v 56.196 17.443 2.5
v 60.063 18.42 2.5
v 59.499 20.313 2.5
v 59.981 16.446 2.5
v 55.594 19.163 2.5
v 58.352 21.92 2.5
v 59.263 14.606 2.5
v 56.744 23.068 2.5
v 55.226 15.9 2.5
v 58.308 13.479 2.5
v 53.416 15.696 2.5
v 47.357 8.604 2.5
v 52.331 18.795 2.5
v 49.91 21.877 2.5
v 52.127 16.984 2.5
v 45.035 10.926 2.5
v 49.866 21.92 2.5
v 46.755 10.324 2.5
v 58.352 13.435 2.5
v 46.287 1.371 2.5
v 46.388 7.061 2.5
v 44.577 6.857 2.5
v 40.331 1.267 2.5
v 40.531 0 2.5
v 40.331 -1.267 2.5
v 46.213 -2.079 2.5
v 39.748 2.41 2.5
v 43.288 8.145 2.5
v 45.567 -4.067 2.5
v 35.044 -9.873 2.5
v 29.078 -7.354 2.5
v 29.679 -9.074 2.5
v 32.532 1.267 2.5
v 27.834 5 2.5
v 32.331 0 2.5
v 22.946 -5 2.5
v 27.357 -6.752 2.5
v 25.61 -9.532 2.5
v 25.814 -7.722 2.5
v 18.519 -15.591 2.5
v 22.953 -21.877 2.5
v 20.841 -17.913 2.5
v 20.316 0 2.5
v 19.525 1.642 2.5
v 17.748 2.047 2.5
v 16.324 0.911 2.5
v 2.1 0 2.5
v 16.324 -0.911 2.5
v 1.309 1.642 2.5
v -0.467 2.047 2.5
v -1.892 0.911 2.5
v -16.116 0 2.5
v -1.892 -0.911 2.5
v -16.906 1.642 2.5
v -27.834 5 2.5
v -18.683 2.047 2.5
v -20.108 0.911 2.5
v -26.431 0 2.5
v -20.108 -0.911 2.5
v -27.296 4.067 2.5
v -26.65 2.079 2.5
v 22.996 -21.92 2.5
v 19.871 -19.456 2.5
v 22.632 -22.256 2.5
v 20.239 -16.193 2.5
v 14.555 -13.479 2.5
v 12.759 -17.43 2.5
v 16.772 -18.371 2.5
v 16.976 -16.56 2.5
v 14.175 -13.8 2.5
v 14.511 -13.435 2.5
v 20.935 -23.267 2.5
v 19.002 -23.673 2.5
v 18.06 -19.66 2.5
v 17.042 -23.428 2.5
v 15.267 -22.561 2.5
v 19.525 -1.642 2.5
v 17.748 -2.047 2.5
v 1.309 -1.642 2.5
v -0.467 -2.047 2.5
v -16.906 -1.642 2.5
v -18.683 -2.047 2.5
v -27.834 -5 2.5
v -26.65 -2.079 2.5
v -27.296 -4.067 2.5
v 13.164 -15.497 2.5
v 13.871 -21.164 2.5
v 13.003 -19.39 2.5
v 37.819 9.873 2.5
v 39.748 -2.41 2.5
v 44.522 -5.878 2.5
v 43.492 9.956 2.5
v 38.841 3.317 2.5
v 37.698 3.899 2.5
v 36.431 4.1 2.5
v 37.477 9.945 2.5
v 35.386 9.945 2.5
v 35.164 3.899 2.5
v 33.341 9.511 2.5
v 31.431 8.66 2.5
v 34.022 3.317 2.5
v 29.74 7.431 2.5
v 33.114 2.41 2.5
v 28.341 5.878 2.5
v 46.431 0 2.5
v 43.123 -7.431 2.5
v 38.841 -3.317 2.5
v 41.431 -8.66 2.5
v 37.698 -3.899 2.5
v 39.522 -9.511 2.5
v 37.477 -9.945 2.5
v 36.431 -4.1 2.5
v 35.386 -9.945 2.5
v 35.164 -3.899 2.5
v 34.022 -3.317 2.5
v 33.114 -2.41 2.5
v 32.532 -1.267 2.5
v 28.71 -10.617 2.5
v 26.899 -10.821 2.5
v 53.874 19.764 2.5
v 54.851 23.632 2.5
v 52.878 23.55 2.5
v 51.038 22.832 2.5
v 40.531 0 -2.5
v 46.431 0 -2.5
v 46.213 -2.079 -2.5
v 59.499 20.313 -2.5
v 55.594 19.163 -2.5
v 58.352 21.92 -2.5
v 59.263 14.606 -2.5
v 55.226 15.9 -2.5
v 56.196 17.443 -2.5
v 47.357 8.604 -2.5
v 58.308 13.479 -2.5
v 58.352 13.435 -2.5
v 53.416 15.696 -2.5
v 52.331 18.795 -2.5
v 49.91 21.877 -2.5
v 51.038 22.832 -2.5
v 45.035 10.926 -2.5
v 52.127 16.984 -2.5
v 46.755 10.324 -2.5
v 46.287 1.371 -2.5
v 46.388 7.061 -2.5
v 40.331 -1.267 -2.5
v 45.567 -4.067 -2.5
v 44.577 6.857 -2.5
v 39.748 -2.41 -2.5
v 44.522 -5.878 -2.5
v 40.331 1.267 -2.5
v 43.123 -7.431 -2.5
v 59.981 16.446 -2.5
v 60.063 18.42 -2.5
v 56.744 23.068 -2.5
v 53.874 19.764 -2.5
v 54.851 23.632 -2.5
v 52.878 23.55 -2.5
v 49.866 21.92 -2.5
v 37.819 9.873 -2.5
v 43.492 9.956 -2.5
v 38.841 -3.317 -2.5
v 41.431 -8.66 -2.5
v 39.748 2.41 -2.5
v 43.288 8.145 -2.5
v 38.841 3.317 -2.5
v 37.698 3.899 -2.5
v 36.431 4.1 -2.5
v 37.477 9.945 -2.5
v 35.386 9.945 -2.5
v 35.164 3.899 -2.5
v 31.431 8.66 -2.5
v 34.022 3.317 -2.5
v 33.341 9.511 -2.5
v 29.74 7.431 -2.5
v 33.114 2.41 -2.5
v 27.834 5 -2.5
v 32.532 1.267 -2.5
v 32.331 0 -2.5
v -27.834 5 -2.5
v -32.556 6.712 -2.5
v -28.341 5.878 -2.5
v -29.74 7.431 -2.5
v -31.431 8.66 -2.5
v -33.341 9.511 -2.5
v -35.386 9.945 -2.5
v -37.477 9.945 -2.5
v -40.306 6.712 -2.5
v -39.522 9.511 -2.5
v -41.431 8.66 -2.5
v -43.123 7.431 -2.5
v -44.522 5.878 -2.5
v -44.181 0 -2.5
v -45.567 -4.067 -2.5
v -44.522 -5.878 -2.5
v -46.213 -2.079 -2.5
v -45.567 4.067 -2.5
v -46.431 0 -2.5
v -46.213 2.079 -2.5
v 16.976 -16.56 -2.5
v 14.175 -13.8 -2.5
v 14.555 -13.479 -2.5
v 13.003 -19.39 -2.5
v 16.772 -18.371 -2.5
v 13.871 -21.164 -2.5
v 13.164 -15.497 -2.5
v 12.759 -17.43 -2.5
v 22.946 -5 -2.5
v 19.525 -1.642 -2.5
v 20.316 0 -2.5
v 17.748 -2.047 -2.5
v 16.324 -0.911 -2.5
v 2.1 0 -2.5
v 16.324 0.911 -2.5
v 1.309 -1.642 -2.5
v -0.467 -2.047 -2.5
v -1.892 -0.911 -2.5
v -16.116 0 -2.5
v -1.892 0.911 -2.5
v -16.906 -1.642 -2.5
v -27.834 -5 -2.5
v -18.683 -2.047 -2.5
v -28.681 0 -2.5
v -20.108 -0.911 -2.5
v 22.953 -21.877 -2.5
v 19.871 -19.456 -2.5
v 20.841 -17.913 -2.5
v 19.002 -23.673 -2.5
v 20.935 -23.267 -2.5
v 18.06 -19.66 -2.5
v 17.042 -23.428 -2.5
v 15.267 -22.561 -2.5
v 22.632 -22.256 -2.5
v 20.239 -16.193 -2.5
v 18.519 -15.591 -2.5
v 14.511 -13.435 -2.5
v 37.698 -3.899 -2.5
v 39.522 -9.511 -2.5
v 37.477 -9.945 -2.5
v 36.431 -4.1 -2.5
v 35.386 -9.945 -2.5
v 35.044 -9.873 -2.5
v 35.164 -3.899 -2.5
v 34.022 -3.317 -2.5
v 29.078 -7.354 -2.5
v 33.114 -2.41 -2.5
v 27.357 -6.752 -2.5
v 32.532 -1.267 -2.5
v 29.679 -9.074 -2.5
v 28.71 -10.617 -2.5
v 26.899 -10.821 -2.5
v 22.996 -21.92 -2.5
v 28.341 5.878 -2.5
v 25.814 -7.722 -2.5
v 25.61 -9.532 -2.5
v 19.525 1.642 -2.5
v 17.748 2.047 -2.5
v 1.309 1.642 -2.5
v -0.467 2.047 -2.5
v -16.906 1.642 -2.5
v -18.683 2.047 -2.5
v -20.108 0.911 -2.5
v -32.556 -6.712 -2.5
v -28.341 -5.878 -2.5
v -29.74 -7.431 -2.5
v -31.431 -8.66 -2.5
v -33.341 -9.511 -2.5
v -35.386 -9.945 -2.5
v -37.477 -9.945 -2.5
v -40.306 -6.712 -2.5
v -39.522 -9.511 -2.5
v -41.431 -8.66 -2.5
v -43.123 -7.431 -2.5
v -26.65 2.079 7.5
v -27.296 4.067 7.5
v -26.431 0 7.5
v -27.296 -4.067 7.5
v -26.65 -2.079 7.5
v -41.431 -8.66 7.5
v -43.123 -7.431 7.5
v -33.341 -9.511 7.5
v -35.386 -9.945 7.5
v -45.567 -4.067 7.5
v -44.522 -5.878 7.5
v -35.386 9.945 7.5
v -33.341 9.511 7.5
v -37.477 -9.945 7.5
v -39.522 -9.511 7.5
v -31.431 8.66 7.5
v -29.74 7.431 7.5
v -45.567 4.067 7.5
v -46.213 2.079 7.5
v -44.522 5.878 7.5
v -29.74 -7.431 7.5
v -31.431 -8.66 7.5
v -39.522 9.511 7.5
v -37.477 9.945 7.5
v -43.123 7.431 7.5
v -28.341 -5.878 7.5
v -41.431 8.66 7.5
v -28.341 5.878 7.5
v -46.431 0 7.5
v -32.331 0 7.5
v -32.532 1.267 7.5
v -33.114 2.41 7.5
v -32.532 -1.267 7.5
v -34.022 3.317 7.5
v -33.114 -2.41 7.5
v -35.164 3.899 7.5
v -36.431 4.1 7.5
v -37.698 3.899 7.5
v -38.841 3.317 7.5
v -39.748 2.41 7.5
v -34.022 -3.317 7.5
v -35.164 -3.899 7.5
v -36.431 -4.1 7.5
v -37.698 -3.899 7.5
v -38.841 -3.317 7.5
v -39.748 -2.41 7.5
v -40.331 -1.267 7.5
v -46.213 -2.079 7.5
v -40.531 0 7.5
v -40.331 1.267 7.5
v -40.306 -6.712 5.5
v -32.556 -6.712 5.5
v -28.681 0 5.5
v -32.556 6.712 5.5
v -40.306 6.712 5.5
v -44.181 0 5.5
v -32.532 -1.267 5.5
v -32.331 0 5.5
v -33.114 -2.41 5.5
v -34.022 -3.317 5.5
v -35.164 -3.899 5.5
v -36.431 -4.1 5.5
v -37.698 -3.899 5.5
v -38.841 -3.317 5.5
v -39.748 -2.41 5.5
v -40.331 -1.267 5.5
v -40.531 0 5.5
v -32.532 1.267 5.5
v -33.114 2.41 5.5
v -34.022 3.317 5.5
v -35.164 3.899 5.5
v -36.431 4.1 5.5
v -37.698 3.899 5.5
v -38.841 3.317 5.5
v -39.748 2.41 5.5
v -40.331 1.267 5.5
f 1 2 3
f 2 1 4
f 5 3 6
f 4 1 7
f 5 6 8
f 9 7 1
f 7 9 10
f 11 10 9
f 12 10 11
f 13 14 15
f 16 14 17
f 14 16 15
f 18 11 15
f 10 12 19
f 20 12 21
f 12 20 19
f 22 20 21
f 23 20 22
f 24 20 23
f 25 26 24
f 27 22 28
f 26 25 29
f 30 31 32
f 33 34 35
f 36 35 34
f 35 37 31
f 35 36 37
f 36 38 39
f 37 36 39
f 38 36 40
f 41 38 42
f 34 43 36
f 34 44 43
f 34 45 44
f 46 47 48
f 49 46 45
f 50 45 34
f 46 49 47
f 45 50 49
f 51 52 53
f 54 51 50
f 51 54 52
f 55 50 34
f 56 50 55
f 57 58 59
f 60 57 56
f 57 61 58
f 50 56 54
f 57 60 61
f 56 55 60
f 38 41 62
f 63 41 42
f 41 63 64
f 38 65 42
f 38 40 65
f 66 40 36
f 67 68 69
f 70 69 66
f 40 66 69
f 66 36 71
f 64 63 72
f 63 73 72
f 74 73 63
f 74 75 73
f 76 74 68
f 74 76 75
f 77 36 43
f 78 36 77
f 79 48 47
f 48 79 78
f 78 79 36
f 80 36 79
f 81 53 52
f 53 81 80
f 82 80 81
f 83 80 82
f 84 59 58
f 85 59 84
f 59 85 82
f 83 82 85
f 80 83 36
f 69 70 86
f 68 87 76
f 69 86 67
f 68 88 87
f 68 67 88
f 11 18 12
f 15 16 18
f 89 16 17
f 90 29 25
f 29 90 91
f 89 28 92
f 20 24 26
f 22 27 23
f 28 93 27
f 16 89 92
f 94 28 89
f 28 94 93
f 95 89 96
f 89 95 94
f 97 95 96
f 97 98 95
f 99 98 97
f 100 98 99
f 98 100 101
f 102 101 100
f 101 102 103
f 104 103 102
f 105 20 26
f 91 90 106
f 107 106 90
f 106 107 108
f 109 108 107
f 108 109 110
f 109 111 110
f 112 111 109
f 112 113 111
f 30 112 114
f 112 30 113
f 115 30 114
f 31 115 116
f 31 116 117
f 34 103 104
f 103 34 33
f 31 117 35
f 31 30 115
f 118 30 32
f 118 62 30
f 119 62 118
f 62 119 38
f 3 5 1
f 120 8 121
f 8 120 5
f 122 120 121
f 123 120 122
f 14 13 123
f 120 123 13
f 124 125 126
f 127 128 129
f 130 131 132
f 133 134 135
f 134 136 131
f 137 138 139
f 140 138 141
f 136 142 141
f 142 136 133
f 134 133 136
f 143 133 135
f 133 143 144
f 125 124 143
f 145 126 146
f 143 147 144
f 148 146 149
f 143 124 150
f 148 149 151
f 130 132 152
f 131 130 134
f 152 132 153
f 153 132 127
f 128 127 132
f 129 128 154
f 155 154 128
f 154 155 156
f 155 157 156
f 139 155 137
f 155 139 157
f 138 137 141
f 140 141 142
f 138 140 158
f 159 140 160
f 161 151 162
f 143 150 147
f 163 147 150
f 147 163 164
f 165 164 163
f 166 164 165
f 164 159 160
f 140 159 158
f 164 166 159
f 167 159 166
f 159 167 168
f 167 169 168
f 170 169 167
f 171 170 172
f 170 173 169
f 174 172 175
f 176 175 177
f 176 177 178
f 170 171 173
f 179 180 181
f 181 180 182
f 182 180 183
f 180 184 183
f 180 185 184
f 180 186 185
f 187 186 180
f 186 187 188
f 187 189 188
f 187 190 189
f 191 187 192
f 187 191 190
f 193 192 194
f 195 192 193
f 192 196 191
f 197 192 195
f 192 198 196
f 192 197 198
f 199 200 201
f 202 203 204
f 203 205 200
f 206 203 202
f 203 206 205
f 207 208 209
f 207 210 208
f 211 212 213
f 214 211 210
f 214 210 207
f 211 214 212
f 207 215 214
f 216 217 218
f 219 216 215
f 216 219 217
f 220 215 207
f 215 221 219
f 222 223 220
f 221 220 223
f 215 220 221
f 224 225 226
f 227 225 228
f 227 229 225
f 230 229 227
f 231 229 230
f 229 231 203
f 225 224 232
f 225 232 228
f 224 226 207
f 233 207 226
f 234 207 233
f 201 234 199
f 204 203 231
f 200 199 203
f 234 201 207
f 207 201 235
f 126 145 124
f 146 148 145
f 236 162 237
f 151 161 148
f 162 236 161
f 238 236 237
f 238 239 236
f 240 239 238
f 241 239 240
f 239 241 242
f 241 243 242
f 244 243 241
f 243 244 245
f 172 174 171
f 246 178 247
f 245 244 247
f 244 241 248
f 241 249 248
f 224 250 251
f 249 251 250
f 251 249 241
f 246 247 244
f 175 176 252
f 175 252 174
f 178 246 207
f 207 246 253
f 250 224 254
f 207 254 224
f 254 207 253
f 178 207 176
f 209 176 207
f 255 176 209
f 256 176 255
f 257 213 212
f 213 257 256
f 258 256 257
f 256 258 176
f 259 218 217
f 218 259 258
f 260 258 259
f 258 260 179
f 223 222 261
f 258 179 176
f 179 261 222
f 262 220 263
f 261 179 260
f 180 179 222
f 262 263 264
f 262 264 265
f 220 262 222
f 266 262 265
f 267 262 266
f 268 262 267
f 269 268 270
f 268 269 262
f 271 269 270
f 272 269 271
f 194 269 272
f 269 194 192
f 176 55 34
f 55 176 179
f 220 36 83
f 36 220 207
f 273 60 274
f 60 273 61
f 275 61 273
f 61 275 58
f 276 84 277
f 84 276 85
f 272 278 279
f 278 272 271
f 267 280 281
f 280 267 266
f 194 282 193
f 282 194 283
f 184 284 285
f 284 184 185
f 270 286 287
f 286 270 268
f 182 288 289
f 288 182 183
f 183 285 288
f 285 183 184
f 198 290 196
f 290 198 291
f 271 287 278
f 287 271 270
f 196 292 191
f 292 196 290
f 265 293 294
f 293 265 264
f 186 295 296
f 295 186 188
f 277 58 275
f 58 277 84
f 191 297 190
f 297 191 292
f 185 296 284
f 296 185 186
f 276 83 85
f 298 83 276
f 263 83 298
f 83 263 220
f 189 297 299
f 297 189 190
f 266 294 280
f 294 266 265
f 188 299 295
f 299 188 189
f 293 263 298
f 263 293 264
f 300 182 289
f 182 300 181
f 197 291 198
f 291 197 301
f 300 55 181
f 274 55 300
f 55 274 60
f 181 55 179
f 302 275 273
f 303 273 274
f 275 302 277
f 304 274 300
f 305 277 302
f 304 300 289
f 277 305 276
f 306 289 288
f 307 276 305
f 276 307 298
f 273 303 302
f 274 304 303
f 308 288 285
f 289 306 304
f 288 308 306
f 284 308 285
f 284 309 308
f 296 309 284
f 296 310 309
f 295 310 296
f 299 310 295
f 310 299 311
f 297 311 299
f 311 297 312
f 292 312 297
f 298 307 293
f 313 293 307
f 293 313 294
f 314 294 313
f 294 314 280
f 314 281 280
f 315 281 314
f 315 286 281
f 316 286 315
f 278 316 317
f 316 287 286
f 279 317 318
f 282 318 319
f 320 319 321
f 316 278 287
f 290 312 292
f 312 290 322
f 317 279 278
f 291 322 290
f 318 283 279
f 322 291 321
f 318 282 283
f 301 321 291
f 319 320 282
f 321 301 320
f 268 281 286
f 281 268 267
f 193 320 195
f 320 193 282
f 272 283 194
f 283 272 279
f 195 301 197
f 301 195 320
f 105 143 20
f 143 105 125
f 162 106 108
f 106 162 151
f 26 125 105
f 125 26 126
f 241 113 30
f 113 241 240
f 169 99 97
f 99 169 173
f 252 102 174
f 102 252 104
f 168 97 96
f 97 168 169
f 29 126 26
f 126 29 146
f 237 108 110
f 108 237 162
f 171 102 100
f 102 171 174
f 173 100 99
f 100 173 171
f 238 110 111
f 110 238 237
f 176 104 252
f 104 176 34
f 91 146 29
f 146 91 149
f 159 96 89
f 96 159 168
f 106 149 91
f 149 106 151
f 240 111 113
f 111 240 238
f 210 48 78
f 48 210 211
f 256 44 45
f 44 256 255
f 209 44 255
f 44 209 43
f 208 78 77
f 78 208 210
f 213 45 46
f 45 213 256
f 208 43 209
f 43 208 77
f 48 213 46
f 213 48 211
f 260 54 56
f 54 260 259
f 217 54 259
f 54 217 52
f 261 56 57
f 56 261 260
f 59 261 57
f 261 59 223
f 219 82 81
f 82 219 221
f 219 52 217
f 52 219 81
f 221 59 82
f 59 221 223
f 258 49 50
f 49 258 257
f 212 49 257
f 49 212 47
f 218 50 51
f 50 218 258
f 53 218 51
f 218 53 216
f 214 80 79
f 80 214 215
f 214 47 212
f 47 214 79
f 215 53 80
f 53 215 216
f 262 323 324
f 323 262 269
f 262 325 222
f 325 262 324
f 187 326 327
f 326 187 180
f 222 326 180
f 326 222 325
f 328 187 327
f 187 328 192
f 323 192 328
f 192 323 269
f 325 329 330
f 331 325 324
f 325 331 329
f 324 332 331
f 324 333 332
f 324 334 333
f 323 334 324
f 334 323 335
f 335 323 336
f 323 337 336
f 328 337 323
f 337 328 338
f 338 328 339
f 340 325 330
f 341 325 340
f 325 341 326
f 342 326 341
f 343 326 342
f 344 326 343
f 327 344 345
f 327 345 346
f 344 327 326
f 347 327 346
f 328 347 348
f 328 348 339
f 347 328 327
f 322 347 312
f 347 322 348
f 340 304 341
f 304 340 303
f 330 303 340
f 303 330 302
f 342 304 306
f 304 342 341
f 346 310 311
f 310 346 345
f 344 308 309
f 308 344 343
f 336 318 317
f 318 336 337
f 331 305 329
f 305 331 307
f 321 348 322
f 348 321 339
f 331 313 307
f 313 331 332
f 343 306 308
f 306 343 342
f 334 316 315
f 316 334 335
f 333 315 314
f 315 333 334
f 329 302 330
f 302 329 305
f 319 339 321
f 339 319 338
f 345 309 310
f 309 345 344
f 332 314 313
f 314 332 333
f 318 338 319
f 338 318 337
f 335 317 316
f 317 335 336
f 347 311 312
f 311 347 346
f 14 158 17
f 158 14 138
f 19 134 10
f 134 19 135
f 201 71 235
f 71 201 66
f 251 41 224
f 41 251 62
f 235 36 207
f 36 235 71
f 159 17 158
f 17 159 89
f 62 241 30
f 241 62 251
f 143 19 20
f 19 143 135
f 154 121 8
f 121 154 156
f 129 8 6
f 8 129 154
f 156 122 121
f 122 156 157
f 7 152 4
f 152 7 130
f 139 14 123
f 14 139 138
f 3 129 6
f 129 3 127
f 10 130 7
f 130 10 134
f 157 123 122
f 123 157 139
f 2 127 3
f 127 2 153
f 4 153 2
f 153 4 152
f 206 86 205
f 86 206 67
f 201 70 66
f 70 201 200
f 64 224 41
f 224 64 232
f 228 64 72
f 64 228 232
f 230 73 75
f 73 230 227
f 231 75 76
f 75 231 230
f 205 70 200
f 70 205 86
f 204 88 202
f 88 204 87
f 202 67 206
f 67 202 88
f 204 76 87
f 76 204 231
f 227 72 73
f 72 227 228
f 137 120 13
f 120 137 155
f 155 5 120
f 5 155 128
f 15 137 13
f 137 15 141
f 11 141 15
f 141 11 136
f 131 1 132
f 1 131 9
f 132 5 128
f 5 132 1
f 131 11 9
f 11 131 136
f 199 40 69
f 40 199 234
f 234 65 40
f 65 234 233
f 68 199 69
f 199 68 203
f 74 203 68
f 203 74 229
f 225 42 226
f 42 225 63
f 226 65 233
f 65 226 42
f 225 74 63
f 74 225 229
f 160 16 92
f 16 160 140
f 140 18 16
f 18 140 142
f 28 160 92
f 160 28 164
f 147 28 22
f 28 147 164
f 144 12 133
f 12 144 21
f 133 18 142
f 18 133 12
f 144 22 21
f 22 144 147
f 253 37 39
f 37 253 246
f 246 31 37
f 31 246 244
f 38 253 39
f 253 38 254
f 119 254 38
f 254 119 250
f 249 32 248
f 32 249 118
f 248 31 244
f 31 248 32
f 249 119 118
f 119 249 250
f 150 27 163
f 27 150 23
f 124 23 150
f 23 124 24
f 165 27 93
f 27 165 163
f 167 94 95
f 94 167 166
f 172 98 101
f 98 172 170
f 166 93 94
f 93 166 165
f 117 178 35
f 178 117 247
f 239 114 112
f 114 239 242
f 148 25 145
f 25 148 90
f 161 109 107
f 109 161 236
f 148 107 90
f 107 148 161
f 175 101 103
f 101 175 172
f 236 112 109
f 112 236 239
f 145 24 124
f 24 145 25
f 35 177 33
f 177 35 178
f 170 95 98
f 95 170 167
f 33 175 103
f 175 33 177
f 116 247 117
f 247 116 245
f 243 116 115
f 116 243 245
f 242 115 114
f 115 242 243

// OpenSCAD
espesor_pieza=5;
ancho_pieza=10;
longitud_tensor=50;
longitud_brazo=53;
longitud_brazo_suspension=50;


longitud_brazo_diagonal=sqrt(pow(longitud_brazo,2)+pow(longitud_brazo_suspension,2));

suspension();
//brazo_diagonal();
module suspension(){
	difference(){
		union(){
			//brazo principal HORIZONTAL
			brazo_diagonal();
			
			
			translate([longitud_brazo_diagonal/2,,0])
			rotate([0,0,45])
			brazotensor();			
			
			//placa apoyo
			//translate([(-longitud_brazo+ancho_pieza*2.5)/2,-ancho_pieza*1.5,-2.5])
			//cube([20,20,5], center=true);
		}
		/*
		translate([(-longitud_brazo)/2,,0,])
			cube([20,longitud_brazo_suspension-ancho_pieza,40], center=true);
		translate([(longitud_brazo)/2,-longitud_brazo_suspension +(ancho_pieza/4),0])
			cube([20,longitud_brazo_suspension/2+ancho_pieza,40], center=true);
		
		translate([longitud_brazo_diagonal/2,0,3])
			rotate([0,0,45])
		cube([longitud_brazo_suspension-10,ancho_pieza-2 ,espesor_pieza],center=true);
		*/
		translate([longitud_brazo_diagonal/2,0,0])
		cylinder(r=8.2/2, h=espesor_pieza*3,$fn=20, center=true);
	}
}

module brazotensor(){
	difference(){
		union(){
			cube([longitud_tensor,ancho_pieza+2 ,espesor_pieza],center=true);
			translate([longitud_tensor/2,0,0])
			cylinder(r=ancho_pieza/2+1, h=espesor_pieza, center=true);
			translate([-longitud_tensor/2,0,0])
			cylinder(r=ancho_pieza/2+1, h=espesor_pieza, center=true);
		}
		translate([longitud_tensor/2,0,0])
		cylinder(r=4.2/2, h=20, center=true);
		translate([-longitud_tensor/2,0,0])
		cylinder(r=4.2/2, h=20, center=true);
		translate([longitud_tensor/4,0,0])
		cylinder(r=4.2/2, h=20, center=true);
		translate([-longitud_tensor/4,0,0])
		cylinder(r=4.2/2, h=20, center=true);
		cylinder(r=4.2/2, h=20, center=true);

		
	}


}



module brazo_diagonal(){
	difference(){
		union(){
			
			cube([longitud_brazo_diagonal,ancho_pieza ,espesor_pieza],center=true);
			translate([longitud_brazo_diagonal/2,0,0])
			cylinder(r=ancho_pieza/2, h=espesor_pieza, center=true);
			translate([-longitud_brazo_diagonal/2,0,0])
			cylinder(r=ancho_pieza/2, h=espesor_pieza, center=true);

			//redondeo alojamiento tuerca
			translate([-longitud_brazo_diagonal/2,0,espesor_pieza/2])
			cylinder(r=20/2, h=espesor_pieza*2, center=true);
			
			//redondeo alojamiento tuerca
			translate([longitud_brazo_diagonal/2,0,0])
			cylinder(r=20/2, h=espesor_pieza, center=true);
			
		}
		translate([longitud_brazo_diagonal/2,0,0])
		cylinder(r=4.2/2, h=20, center=true);
		translate([-longitud_brazo_diagonal/2,0,0])
		cylinder(r=4.2/2, h=20, center=true);
		translate([longitud_brazo_diagonal/4,0,0])
		cylinder(r=4.2/2, h=20, center=true);
		translate([-longitud_brazo_diagonal/4,0,0])
		cylinder(r=4.2/2, h=20, center=true);
		cylinder(r=4.2/2, h=20, center=true);

		//ALOJAMIENTO TUERCA

		translate([-longitud_brazo_diagonal/2,0,-espesor_pieza/2])
		cylinder(r=15.5/2, h=espesor_pieza*2-2,$fn=6);
		
		//EJE TUERCA
		
		translate([-longitud_brazo_diagonal/2,0,0])
		cylinder(r=8.2/2, h=espesor_pieza*3,$fn=20, center=true);
	}

}


//brazotensor();
